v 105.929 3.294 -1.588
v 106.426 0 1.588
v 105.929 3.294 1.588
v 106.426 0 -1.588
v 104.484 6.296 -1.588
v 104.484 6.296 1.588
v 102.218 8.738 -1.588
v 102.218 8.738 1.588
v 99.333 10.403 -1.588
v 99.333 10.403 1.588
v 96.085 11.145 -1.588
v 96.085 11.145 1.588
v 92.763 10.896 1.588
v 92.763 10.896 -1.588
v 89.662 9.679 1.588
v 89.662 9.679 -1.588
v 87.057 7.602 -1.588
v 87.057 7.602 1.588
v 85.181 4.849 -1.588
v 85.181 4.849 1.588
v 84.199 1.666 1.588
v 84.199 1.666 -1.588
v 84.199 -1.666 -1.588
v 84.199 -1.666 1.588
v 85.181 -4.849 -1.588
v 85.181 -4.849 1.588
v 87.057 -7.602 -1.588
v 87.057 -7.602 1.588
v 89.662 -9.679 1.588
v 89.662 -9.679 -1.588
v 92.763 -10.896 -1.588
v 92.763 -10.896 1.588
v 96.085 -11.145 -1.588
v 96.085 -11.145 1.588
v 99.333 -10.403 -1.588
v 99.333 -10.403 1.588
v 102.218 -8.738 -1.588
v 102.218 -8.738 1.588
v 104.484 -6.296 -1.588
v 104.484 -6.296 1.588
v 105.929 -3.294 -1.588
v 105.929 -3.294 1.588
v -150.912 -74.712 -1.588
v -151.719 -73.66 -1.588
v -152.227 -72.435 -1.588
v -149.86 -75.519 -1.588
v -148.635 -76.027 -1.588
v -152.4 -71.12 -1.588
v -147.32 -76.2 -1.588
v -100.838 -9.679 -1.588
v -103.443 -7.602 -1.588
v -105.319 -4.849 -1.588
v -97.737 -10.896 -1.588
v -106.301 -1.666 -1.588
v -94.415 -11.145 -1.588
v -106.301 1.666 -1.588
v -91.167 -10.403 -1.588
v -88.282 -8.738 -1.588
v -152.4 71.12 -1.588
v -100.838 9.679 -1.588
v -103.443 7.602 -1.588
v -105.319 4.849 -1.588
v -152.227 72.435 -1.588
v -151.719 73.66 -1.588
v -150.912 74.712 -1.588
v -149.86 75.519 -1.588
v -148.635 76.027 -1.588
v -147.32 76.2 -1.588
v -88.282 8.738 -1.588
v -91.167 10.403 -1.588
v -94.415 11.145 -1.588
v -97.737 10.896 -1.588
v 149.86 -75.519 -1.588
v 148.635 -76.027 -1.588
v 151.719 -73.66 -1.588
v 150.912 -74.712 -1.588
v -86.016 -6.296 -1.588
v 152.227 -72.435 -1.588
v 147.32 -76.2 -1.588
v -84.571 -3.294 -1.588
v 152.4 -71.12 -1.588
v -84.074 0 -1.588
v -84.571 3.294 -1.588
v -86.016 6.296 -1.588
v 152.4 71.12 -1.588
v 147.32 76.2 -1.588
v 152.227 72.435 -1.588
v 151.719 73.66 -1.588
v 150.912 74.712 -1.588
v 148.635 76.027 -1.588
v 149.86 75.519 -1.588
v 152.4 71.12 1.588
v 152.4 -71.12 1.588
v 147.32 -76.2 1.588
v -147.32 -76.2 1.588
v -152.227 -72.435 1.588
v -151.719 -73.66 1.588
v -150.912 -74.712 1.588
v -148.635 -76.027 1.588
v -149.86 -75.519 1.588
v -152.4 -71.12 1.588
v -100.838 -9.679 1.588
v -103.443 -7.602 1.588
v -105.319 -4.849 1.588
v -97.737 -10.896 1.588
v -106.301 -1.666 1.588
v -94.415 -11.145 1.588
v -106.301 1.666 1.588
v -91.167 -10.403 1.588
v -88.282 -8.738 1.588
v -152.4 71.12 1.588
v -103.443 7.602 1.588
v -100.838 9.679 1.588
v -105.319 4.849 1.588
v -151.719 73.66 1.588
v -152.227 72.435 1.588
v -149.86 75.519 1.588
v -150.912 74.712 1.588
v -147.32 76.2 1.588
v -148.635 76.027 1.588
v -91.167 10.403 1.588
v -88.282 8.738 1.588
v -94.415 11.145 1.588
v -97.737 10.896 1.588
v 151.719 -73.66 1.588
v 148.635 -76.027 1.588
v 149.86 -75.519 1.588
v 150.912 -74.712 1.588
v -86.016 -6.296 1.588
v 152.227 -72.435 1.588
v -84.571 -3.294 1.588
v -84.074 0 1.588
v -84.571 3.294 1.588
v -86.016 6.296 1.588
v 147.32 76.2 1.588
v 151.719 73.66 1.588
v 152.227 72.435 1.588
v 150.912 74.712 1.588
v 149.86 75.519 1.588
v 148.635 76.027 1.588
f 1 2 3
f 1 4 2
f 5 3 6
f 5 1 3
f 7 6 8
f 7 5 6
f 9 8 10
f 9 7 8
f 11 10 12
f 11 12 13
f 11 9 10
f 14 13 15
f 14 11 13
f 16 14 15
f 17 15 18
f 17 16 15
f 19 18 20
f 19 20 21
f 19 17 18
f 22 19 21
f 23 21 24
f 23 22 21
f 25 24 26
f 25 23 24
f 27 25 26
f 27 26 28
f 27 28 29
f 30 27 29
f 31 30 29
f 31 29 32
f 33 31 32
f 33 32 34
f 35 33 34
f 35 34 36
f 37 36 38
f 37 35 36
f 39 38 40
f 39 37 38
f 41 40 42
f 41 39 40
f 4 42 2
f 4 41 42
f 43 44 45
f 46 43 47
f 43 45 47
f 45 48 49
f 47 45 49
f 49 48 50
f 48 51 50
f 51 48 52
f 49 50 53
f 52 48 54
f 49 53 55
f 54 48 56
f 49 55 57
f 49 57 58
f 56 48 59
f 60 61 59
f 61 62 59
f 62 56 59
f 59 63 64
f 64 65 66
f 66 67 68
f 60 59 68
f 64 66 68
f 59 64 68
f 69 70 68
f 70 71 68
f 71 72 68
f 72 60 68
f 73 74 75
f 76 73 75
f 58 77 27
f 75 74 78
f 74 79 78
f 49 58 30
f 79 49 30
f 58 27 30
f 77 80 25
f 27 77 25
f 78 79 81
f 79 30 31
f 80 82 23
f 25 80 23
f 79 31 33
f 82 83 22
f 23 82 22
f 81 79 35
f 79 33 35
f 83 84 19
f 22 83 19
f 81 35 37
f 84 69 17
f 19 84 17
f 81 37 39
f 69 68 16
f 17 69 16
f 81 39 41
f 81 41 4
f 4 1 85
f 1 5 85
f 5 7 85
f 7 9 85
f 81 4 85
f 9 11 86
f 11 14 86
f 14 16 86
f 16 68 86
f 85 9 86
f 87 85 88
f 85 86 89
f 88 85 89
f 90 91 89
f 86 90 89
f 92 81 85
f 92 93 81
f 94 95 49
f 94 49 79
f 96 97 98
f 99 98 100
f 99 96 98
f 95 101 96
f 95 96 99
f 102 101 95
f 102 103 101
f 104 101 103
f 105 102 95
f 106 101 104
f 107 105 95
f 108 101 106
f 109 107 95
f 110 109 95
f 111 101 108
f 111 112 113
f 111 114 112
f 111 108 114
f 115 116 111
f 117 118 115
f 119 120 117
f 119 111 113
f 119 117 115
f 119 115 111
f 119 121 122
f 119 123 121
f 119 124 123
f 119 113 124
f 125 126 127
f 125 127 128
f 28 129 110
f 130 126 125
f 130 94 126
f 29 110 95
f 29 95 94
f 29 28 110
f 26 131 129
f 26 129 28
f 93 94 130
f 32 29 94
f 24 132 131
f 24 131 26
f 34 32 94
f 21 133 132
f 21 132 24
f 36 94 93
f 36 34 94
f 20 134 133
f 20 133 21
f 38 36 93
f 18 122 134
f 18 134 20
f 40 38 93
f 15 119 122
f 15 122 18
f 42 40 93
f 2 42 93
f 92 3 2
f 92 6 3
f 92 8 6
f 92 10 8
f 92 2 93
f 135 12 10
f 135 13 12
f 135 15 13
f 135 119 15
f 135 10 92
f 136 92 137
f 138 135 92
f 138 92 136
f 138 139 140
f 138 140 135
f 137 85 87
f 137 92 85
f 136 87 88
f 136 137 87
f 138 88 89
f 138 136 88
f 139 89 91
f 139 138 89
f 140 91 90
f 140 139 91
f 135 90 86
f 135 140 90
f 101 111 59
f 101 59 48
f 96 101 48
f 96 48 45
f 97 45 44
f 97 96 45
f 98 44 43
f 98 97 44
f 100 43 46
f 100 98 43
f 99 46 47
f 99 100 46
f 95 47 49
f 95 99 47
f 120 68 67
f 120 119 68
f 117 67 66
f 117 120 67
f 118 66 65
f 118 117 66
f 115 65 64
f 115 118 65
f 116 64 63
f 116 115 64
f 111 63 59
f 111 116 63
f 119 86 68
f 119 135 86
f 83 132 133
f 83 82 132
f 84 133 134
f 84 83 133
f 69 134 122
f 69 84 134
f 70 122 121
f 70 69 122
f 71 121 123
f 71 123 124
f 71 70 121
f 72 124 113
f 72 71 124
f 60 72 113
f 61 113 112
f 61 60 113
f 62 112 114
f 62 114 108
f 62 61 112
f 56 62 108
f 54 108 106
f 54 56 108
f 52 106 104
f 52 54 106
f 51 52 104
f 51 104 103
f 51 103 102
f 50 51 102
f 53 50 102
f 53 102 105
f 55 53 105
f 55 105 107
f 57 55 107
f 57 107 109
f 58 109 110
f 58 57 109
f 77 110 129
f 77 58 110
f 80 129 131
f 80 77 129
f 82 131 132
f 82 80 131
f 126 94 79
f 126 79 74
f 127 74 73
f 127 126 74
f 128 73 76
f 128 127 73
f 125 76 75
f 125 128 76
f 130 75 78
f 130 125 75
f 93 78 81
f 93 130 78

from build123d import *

# Parameters (mm, degrees)
F0_R     = 11.176
F1_DEPTH = 1.5875


with BuildPart() as f1:
    # F0 (on Top) → F1 (new body, symmetric)
    with BuildSketch(Plane.XY):
        with BuildLine():
            ThreePointArc((-147.32, 76.2), (-150.9121024484, 74.7121024484), (-152.4, 71.12))
            Line((-152.4, 71.12), (-152.4, -71.12))
            ThreePointArc((-152.4, -71.12), (-150.9121024484, -74.7121024484), (-147.32, -76.2))
            Line((-147.32, -76.2), (147.32, -76.2))
            ThreePointArc((147.32, -76.2), (150.9121024484, -74.7121024484), (152.4, -71.12))
            Line((152.4, -71.12), (152.4, 71.12))
            ThreePointArc((152.4, 71.12), (150.9121024484, 74.7121024484), (147.32, 76.2))
            Line((147.32, 76.2), (-147.32, 76.2))
        make_face()
        with Locations((-95.25, 0)):
            Circle(F0_R, mode=Mode.SUBTRACT)
        with Locations((95.25, 0)):
            Circle(F0_R, mode=Mode.SUBTRACT)
    extrude(amount=F1_DEPTH, both=True)


solid = f1.part
